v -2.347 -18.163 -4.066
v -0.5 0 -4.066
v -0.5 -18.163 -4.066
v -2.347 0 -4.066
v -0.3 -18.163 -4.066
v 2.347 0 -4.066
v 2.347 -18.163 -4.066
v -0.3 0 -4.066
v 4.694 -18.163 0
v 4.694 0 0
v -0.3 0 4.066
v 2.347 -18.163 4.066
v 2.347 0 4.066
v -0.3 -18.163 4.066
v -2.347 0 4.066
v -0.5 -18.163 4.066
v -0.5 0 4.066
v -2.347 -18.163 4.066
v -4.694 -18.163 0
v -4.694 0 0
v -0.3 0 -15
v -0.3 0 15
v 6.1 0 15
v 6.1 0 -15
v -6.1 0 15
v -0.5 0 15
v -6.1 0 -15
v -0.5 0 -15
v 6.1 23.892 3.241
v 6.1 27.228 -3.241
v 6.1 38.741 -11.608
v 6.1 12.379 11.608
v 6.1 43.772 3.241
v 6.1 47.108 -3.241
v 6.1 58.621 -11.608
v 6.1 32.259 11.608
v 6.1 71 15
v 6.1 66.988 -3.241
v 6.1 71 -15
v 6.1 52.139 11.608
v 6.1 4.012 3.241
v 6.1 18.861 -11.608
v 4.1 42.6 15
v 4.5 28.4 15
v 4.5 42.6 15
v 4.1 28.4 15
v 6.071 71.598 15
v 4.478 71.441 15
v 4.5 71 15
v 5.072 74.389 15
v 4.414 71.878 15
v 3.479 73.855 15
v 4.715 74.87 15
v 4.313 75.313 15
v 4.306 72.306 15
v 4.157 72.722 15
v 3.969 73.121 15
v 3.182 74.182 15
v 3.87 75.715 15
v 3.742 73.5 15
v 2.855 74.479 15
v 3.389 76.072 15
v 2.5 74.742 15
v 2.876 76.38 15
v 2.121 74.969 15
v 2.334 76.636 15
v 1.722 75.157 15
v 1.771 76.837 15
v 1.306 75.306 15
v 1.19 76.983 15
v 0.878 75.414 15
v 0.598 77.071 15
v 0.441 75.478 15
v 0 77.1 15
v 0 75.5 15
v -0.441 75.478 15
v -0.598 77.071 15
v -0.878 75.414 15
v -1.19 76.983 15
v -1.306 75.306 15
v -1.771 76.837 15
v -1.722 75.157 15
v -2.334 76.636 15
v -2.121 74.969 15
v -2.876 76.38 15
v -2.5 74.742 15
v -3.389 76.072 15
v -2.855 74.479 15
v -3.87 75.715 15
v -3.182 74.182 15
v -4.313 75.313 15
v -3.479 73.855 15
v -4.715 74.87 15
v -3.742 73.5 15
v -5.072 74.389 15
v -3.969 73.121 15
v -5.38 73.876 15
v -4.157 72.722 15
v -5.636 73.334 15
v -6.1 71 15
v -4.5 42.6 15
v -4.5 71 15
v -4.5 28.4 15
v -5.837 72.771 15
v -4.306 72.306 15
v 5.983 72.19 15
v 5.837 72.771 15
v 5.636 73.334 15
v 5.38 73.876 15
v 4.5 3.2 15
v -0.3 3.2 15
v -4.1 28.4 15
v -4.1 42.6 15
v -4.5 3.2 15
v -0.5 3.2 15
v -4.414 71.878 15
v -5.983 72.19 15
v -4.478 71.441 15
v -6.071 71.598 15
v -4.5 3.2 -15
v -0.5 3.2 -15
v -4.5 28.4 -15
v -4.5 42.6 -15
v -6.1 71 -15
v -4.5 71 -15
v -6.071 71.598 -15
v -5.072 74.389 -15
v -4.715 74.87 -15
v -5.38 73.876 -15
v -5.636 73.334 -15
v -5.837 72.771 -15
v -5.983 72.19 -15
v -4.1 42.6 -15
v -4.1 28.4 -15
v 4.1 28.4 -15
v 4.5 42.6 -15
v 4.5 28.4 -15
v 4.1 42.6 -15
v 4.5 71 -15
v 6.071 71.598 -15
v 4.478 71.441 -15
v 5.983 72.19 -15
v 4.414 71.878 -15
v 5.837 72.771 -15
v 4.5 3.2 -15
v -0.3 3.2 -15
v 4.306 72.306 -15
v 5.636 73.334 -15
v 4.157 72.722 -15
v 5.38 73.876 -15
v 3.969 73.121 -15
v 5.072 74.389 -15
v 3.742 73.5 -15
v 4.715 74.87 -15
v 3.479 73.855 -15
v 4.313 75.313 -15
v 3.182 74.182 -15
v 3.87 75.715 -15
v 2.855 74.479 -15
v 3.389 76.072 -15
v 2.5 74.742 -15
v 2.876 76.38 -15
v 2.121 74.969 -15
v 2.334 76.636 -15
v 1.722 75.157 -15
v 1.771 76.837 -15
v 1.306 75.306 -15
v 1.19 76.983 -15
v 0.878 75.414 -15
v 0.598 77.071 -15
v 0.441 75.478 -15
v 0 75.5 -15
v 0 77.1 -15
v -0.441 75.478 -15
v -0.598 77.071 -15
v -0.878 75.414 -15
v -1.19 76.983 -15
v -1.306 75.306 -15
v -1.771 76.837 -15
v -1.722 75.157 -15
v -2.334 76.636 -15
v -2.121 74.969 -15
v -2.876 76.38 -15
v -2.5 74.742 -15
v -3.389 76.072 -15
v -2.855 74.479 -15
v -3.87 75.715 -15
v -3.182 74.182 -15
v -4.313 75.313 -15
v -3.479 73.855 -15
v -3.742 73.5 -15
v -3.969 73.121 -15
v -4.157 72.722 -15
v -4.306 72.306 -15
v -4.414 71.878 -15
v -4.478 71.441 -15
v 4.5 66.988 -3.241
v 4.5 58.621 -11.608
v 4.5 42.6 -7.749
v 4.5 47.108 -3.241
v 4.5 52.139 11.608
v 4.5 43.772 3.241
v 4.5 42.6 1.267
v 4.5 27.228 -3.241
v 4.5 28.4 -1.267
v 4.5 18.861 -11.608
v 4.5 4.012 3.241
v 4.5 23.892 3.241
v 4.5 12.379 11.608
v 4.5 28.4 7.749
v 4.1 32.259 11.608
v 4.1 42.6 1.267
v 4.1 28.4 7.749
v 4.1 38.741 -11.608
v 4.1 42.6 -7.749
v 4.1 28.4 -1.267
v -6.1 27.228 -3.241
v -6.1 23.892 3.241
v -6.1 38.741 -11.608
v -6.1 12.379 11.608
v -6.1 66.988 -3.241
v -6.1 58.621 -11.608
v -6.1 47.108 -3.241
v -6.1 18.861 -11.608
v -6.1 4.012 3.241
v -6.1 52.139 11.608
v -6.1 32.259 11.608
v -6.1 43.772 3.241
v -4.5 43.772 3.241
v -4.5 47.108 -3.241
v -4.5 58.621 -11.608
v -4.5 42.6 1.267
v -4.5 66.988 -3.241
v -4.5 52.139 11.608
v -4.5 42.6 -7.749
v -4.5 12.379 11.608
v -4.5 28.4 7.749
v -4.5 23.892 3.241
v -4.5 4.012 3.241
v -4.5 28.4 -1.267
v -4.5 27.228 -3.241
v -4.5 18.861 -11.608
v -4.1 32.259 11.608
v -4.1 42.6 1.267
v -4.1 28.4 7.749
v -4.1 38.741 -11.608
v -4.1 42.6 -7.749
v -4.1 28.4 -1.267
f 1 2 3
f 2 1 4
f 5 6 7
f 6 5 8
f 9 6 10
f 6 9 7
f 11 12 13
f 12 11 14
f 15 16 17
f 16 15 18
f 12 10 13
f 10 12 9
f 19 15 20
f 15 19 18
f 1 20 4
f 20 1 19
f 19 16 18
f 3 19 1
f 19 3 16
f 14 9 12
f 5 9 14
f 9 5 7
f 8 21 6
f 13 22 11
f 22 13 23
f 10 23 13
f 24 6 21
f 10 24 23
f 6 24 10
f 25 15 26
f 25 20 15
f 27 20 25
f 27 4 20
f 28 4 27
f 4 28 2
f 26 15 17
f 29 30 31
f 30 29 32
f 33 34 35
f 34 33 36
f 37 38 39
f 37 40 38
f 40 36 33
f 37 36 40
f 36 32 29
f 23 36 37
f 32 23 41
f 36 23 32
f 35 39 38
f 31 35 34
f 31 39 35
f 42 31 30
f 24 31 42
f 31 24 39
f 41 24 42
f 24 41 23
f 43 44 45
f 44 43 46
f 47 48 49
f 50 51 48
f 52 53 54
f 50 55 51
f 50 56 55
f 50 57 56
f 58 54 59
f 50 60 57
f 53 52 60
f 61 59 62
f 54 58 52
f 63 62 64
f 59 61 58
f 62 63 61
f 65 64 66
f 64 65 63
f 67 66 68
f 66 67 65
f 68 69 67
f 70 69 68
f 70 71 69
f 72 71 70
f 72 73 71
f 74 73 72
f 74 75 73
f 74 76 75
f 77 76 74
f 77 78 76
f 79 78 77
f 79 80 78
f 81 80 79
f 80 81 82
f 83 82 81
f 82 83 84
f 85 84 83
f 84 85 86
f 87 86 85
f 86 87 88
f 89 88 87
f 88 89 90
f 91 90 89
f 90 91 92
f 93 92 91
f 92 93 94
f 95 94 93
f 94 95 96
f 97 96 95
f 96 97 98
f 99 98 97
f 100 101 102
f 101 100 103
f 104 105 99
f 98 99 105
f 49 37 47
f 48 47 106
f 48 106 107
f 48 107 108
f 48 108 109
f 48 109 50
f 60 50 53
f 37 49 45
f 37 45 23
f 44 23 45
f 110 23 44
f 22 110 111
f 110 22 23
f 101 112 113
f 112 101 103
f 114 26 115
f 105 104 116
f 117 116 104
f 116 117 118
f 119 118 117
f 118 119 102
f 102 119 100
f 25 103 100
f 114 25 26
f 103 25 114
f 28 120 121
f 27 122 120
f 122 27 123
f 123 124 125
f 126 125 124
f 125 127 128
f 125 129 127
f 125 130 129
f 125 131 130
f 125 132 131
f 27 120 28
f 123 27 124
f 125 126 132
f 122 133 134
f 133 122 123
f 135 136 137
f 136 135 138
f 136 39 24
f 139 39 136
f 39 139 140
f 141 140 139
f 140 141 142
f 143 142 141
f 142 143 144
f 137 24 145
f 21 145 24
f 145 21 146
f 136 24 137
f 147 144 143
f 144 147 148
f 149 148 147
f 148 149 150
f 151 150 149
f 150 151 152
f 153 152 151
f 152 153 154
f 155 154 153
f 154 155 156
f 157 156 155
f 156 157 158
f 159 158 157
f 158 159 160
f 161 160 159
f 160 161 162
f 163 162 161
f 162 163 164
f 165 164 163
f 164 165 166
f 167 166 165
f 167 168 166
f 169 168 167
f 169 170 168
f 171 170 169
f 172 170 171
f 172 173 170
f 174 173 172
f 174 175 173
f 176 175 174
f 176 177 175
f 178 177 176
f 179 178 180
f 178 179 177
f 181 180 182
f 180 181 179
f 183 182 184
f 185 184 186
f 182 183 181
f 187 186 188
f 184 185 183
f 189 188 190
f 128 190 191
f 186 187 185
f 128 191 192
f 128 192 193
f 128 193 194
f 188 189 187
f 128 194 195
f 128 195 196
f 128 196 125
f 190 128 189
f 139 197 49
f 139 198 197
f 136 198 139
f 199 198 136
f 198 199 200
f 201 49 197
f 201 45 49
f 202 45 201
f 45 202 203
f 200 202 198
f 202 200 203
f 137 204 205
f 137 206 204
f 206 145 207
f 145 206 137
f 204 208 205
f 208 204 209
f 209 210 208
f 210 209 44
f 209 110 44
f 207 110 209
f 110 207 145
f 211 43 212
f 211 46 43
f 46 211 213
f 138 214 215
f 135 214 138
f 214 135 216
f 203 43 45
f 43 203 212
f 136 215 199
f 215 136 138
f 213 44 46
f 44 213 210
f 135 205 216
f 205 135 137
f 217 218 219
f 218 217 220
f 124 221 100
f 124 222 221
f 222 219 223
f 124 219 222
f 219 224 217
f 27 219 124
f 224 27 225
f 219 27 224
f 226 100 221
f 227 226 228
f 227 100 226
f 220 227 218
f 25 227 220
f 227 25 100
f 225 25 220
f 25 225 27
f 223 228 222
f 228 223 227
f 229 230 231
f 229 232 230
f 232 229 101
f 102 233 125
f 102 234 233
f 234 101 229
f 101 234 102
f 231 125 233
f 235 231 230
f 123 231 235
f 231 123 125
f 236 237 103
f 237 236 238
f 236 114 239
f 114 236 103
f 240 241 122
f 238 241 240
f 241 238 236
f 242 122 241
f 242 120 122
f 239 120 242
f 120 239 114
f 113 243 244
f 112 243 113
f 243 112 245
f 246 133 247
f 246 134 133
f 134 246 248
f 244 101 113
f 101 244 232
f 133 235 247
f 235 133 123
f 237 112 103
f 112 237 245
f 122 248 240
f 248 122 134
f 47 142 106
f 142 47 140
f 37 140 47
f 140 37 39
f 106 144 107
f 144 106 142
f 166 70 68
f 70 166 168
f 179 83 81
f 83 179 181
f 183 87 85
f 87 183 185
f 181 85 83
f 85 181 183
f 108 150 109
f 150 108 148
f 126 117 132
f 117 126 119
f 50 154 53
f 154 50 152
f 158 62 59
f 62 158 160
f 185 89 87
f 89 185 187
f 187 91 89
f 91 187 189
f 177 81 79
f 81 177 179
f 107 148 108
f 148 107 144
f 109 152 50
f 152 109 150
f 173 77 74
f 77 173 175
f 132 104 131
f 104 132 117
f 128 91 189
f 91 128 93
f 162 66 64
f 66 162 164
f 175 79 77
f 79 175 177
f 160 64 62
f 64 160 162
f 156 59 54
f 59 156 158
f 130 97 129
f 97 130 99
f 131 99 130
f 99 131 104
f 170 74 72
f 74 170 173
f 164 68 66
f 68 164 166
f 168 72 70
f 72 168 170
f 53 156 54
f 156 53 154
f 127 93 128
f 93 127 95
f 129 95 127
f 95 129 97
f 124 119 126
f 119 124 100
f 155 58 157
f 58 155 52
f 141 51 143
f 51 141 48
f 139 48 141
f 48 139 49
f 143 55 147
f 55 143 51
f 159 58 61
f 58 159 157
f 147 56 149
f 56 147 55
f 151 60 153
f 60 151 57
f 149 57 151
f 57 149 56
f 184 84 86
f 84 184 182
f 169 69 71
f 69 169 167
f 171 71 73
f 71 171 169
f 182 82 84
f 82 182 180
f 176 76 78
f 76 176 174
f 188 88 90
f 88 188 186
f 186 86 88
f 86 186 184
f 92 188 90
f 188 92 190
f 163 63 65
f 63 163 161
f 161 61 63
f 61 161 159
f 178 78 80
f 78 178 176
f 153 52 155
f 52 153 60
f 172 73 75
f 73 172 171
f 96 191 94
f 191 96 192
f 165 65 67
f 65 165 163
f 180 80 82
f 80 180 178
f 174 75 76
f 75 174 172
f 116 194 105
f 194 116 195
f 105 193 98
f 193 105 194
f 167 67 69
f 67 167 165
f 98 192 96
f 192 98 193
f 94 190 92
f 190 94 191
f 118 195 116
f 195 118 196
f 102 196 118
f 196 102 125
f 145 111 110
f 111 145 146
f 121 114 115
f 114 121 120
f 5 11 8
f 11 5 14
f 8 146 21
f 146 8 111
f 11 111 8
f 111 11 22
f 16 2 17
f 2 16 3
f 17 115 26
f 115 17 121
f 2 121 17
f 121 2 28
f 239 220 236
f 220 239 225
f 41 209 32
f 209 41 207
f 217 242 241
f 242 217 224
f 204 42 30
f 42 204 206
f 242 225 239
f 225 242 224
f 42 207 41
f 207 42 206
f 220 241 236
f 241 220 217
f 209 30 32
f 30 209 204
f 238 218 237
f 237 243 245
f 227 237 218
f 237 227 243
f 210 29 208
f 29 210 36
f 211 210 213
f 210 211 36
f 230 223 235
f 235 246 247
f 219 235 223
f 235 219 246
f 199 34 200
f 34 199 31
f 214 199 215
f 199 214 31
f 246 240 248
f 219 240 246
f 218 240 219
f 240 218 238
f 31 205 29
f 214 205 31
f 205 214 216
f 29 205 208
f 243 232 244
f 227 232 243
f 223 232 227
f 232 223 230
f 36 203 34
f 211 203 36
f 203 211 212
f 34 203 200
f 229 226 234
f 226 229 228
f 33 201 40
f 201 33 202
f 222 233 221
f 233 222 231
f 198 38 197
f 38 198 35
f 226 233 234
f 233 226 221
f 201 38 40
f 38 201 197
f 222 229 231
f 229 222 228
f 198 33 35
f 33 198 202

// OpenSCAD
$fn=64;


difference() {
	difference() {
		union() {
			rotate(a = [90, 0, 0]) {
				union() {
					translate(v = [0, 0, 10]) {
						cylinder(r1 = 4.6944444444, r2 = 4.6944444444, $fn = 6, h = 8.1629146123);
					}
					cylinder($fn = 6, h = 10, r = 4.6944444444);
				}
			}
			translate(v = [0, 0, -15.0000000000]) {
				union() {
					union() {
						union() {
							translate(v = [4.5000000000, 0, 0]) {
								union() {
									cube(size = [1.6000000000, 71.0000000000, 30.0000000000]);
									translate(v = [0, 28.4000000000, 0]) {
										translate(v = [-0.4000000000, 0, 0]) {
											cube(size = [0.4000000000, 14.2000000000, 30.0000000000]);
										}
									}
								}
							}
							mirror(v = [1, 0, 0]) {
								translate(v = [4.5000000000, 0, 0]) {
									union() {
										cube(size = [1.6000000000, 71.0000000000, 30.0000000000]);
										translate(v = [0, 28.4000000000, 0]) {
											translate(v = [-0.4000000000, 0, 0]) {
												cube(size = [0.4000000000, 14.2000000000, 30.0000000000]);
											}
										}
									}
								}
							}
						}
						translate(v = [0, 71.0000000000, 0]) {
							intersection() {
								difference() {
									cylinder(h = 30.0000000000, r = 6.1000000000);
									translate(v = [0, 0, -0.5000000000]) {
										cylinder(h = 31.0000000000, r = 4.5000000000);
									}
								}
								translate(v = [-6.1000000000, 0, 0]) {
									cube(size = [12.2000000000, 10.6000000000, 30.0000000000]);
								}
							}
						}
					}
					translate(v = [-6.1000000000, 0, 0]) {
						cube(size = [10.6000000000, 3.2000000000, 30.0000000000]);
					}
				}
			}
		}
		translate(v = [-0.5000000000, 0, 0]) {
			translate(v = [0, -32.6516584492, 0]) {
				translate(v = [0, 0, -15.0000000000]) {
					translate(v = [0, 0, -0.5000000000]) {
						cube(size = [0.2000000000, 48.9774876738, 31.0000000000]);
					}
				}
			}
		}
	}
	union() {
		union() {
			translate(v = [0, 15.6200000000, 0]) {
				rotate(a = [45, 0, 0]) {
					cube(center = true, size = [18.0000000000, 11.8333333333, 21.0000000000]);
				}
			}
			translate(v = [0, 35.5000000000, 0]) {
				rotate(a = [45, 0, 0]) {
					cube(center = true, size = [18.0000000000, 11.8333333333, 21.0000000000]);
				}
			}
		}
		translate(v = [0, 55.3800000000, 0]) {
			rotate(a = [45, 0, 0]) {
				cube(center = true, size = [18.0000000000, 11.8333333333, 21.0000000000]);
			}
		}
	}
}
